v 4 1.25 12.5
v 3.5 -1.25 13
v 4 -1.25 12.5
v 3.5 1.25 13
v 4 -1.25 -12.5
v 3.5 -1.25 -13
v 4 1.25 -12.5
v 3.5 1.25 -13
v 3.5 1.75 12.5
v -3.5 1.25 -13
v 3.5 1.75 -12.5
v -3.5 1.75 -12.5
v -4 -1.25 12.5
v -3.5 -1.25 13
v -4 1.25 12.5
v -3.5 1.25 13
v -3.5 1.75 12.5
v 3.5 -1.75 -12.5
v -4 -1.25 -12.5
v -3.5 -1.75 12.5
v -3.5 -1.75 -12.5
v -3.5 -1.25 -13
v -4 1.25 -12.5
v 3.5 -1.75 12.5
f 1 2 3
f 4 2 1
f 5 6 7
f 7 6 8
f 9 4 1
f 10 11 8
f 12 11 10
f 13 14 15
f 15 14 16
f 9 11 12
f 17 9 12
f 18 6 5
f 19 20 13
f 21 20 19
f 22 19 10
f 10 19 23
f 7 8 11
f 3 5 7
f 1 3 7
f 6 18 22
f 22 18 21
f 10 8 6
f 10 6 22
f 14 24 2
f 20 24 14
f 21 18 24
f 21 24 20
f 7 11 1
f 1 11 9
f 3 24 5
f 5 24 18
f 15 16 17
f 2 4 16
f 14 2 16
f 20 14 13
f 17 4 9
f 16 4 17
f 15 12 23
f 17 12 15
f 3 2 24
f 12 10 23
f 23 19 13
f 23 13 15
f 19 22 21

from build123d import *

# Parameters (mm, degrees)
SKETCH1_W           = 8
SKETCH1_H           = 3.5
BOSS_EXTRUDE1_DEPTH = 5
SKETCH2_W           = 8
SKETCH2_H           = 3.5
BOSS_EXTRUDE2_DEPTH = 8
CHAMFER1_SIZE       = 0.5


with BuildPart() as part:
    # Sketch1 → Boss-Extrude1 (new, symmetric)
    with BuildSketch(Plane.XY):
        Rectangle(SKETCH1_W, SKETCH1_H)
    extrude(amount=BOSS_EXTRUDE1_DEPTH, both=True)

    # Sketch2 → Boss-Extrude2 (add)
    with BuildSketch(Plane(origin=(0, 0, -5), x_dir=(-1, 0, 0), z_dir=(0, 0, -1))):
        Rectangle(SKETCH2_W, SKETCH2_H)
    boss_extrude2 = extrude(amount=BOSS_EXTRUDE2_DEPTH)

    # Mirror1: Boss-Extrude2 across plane
    add(boss_extrude2.mirror(Plane.XY))

    # Chamfer1
    chamfer1_edges = [part.edges().sort_by_distance(p)[0] for p in [
        (-4, 0, -13),
        (0, 1.75, -13),
        (4, 0, -13),
        (0, -1.75, -13),
        (-4, 0, 13),
        (0, -1.75, 13),
        (4, 0, 13),
        (0, 1.75, 13),
        (4, -1.75, 0),
        (-4, -1.75, 0),
        (-4, 1.75, 0),
        (4, 1.75, 0),
    ]]
    chamfer(chamfer1_edges, length=CHAMFER1_SIZE)


solid = part.part
